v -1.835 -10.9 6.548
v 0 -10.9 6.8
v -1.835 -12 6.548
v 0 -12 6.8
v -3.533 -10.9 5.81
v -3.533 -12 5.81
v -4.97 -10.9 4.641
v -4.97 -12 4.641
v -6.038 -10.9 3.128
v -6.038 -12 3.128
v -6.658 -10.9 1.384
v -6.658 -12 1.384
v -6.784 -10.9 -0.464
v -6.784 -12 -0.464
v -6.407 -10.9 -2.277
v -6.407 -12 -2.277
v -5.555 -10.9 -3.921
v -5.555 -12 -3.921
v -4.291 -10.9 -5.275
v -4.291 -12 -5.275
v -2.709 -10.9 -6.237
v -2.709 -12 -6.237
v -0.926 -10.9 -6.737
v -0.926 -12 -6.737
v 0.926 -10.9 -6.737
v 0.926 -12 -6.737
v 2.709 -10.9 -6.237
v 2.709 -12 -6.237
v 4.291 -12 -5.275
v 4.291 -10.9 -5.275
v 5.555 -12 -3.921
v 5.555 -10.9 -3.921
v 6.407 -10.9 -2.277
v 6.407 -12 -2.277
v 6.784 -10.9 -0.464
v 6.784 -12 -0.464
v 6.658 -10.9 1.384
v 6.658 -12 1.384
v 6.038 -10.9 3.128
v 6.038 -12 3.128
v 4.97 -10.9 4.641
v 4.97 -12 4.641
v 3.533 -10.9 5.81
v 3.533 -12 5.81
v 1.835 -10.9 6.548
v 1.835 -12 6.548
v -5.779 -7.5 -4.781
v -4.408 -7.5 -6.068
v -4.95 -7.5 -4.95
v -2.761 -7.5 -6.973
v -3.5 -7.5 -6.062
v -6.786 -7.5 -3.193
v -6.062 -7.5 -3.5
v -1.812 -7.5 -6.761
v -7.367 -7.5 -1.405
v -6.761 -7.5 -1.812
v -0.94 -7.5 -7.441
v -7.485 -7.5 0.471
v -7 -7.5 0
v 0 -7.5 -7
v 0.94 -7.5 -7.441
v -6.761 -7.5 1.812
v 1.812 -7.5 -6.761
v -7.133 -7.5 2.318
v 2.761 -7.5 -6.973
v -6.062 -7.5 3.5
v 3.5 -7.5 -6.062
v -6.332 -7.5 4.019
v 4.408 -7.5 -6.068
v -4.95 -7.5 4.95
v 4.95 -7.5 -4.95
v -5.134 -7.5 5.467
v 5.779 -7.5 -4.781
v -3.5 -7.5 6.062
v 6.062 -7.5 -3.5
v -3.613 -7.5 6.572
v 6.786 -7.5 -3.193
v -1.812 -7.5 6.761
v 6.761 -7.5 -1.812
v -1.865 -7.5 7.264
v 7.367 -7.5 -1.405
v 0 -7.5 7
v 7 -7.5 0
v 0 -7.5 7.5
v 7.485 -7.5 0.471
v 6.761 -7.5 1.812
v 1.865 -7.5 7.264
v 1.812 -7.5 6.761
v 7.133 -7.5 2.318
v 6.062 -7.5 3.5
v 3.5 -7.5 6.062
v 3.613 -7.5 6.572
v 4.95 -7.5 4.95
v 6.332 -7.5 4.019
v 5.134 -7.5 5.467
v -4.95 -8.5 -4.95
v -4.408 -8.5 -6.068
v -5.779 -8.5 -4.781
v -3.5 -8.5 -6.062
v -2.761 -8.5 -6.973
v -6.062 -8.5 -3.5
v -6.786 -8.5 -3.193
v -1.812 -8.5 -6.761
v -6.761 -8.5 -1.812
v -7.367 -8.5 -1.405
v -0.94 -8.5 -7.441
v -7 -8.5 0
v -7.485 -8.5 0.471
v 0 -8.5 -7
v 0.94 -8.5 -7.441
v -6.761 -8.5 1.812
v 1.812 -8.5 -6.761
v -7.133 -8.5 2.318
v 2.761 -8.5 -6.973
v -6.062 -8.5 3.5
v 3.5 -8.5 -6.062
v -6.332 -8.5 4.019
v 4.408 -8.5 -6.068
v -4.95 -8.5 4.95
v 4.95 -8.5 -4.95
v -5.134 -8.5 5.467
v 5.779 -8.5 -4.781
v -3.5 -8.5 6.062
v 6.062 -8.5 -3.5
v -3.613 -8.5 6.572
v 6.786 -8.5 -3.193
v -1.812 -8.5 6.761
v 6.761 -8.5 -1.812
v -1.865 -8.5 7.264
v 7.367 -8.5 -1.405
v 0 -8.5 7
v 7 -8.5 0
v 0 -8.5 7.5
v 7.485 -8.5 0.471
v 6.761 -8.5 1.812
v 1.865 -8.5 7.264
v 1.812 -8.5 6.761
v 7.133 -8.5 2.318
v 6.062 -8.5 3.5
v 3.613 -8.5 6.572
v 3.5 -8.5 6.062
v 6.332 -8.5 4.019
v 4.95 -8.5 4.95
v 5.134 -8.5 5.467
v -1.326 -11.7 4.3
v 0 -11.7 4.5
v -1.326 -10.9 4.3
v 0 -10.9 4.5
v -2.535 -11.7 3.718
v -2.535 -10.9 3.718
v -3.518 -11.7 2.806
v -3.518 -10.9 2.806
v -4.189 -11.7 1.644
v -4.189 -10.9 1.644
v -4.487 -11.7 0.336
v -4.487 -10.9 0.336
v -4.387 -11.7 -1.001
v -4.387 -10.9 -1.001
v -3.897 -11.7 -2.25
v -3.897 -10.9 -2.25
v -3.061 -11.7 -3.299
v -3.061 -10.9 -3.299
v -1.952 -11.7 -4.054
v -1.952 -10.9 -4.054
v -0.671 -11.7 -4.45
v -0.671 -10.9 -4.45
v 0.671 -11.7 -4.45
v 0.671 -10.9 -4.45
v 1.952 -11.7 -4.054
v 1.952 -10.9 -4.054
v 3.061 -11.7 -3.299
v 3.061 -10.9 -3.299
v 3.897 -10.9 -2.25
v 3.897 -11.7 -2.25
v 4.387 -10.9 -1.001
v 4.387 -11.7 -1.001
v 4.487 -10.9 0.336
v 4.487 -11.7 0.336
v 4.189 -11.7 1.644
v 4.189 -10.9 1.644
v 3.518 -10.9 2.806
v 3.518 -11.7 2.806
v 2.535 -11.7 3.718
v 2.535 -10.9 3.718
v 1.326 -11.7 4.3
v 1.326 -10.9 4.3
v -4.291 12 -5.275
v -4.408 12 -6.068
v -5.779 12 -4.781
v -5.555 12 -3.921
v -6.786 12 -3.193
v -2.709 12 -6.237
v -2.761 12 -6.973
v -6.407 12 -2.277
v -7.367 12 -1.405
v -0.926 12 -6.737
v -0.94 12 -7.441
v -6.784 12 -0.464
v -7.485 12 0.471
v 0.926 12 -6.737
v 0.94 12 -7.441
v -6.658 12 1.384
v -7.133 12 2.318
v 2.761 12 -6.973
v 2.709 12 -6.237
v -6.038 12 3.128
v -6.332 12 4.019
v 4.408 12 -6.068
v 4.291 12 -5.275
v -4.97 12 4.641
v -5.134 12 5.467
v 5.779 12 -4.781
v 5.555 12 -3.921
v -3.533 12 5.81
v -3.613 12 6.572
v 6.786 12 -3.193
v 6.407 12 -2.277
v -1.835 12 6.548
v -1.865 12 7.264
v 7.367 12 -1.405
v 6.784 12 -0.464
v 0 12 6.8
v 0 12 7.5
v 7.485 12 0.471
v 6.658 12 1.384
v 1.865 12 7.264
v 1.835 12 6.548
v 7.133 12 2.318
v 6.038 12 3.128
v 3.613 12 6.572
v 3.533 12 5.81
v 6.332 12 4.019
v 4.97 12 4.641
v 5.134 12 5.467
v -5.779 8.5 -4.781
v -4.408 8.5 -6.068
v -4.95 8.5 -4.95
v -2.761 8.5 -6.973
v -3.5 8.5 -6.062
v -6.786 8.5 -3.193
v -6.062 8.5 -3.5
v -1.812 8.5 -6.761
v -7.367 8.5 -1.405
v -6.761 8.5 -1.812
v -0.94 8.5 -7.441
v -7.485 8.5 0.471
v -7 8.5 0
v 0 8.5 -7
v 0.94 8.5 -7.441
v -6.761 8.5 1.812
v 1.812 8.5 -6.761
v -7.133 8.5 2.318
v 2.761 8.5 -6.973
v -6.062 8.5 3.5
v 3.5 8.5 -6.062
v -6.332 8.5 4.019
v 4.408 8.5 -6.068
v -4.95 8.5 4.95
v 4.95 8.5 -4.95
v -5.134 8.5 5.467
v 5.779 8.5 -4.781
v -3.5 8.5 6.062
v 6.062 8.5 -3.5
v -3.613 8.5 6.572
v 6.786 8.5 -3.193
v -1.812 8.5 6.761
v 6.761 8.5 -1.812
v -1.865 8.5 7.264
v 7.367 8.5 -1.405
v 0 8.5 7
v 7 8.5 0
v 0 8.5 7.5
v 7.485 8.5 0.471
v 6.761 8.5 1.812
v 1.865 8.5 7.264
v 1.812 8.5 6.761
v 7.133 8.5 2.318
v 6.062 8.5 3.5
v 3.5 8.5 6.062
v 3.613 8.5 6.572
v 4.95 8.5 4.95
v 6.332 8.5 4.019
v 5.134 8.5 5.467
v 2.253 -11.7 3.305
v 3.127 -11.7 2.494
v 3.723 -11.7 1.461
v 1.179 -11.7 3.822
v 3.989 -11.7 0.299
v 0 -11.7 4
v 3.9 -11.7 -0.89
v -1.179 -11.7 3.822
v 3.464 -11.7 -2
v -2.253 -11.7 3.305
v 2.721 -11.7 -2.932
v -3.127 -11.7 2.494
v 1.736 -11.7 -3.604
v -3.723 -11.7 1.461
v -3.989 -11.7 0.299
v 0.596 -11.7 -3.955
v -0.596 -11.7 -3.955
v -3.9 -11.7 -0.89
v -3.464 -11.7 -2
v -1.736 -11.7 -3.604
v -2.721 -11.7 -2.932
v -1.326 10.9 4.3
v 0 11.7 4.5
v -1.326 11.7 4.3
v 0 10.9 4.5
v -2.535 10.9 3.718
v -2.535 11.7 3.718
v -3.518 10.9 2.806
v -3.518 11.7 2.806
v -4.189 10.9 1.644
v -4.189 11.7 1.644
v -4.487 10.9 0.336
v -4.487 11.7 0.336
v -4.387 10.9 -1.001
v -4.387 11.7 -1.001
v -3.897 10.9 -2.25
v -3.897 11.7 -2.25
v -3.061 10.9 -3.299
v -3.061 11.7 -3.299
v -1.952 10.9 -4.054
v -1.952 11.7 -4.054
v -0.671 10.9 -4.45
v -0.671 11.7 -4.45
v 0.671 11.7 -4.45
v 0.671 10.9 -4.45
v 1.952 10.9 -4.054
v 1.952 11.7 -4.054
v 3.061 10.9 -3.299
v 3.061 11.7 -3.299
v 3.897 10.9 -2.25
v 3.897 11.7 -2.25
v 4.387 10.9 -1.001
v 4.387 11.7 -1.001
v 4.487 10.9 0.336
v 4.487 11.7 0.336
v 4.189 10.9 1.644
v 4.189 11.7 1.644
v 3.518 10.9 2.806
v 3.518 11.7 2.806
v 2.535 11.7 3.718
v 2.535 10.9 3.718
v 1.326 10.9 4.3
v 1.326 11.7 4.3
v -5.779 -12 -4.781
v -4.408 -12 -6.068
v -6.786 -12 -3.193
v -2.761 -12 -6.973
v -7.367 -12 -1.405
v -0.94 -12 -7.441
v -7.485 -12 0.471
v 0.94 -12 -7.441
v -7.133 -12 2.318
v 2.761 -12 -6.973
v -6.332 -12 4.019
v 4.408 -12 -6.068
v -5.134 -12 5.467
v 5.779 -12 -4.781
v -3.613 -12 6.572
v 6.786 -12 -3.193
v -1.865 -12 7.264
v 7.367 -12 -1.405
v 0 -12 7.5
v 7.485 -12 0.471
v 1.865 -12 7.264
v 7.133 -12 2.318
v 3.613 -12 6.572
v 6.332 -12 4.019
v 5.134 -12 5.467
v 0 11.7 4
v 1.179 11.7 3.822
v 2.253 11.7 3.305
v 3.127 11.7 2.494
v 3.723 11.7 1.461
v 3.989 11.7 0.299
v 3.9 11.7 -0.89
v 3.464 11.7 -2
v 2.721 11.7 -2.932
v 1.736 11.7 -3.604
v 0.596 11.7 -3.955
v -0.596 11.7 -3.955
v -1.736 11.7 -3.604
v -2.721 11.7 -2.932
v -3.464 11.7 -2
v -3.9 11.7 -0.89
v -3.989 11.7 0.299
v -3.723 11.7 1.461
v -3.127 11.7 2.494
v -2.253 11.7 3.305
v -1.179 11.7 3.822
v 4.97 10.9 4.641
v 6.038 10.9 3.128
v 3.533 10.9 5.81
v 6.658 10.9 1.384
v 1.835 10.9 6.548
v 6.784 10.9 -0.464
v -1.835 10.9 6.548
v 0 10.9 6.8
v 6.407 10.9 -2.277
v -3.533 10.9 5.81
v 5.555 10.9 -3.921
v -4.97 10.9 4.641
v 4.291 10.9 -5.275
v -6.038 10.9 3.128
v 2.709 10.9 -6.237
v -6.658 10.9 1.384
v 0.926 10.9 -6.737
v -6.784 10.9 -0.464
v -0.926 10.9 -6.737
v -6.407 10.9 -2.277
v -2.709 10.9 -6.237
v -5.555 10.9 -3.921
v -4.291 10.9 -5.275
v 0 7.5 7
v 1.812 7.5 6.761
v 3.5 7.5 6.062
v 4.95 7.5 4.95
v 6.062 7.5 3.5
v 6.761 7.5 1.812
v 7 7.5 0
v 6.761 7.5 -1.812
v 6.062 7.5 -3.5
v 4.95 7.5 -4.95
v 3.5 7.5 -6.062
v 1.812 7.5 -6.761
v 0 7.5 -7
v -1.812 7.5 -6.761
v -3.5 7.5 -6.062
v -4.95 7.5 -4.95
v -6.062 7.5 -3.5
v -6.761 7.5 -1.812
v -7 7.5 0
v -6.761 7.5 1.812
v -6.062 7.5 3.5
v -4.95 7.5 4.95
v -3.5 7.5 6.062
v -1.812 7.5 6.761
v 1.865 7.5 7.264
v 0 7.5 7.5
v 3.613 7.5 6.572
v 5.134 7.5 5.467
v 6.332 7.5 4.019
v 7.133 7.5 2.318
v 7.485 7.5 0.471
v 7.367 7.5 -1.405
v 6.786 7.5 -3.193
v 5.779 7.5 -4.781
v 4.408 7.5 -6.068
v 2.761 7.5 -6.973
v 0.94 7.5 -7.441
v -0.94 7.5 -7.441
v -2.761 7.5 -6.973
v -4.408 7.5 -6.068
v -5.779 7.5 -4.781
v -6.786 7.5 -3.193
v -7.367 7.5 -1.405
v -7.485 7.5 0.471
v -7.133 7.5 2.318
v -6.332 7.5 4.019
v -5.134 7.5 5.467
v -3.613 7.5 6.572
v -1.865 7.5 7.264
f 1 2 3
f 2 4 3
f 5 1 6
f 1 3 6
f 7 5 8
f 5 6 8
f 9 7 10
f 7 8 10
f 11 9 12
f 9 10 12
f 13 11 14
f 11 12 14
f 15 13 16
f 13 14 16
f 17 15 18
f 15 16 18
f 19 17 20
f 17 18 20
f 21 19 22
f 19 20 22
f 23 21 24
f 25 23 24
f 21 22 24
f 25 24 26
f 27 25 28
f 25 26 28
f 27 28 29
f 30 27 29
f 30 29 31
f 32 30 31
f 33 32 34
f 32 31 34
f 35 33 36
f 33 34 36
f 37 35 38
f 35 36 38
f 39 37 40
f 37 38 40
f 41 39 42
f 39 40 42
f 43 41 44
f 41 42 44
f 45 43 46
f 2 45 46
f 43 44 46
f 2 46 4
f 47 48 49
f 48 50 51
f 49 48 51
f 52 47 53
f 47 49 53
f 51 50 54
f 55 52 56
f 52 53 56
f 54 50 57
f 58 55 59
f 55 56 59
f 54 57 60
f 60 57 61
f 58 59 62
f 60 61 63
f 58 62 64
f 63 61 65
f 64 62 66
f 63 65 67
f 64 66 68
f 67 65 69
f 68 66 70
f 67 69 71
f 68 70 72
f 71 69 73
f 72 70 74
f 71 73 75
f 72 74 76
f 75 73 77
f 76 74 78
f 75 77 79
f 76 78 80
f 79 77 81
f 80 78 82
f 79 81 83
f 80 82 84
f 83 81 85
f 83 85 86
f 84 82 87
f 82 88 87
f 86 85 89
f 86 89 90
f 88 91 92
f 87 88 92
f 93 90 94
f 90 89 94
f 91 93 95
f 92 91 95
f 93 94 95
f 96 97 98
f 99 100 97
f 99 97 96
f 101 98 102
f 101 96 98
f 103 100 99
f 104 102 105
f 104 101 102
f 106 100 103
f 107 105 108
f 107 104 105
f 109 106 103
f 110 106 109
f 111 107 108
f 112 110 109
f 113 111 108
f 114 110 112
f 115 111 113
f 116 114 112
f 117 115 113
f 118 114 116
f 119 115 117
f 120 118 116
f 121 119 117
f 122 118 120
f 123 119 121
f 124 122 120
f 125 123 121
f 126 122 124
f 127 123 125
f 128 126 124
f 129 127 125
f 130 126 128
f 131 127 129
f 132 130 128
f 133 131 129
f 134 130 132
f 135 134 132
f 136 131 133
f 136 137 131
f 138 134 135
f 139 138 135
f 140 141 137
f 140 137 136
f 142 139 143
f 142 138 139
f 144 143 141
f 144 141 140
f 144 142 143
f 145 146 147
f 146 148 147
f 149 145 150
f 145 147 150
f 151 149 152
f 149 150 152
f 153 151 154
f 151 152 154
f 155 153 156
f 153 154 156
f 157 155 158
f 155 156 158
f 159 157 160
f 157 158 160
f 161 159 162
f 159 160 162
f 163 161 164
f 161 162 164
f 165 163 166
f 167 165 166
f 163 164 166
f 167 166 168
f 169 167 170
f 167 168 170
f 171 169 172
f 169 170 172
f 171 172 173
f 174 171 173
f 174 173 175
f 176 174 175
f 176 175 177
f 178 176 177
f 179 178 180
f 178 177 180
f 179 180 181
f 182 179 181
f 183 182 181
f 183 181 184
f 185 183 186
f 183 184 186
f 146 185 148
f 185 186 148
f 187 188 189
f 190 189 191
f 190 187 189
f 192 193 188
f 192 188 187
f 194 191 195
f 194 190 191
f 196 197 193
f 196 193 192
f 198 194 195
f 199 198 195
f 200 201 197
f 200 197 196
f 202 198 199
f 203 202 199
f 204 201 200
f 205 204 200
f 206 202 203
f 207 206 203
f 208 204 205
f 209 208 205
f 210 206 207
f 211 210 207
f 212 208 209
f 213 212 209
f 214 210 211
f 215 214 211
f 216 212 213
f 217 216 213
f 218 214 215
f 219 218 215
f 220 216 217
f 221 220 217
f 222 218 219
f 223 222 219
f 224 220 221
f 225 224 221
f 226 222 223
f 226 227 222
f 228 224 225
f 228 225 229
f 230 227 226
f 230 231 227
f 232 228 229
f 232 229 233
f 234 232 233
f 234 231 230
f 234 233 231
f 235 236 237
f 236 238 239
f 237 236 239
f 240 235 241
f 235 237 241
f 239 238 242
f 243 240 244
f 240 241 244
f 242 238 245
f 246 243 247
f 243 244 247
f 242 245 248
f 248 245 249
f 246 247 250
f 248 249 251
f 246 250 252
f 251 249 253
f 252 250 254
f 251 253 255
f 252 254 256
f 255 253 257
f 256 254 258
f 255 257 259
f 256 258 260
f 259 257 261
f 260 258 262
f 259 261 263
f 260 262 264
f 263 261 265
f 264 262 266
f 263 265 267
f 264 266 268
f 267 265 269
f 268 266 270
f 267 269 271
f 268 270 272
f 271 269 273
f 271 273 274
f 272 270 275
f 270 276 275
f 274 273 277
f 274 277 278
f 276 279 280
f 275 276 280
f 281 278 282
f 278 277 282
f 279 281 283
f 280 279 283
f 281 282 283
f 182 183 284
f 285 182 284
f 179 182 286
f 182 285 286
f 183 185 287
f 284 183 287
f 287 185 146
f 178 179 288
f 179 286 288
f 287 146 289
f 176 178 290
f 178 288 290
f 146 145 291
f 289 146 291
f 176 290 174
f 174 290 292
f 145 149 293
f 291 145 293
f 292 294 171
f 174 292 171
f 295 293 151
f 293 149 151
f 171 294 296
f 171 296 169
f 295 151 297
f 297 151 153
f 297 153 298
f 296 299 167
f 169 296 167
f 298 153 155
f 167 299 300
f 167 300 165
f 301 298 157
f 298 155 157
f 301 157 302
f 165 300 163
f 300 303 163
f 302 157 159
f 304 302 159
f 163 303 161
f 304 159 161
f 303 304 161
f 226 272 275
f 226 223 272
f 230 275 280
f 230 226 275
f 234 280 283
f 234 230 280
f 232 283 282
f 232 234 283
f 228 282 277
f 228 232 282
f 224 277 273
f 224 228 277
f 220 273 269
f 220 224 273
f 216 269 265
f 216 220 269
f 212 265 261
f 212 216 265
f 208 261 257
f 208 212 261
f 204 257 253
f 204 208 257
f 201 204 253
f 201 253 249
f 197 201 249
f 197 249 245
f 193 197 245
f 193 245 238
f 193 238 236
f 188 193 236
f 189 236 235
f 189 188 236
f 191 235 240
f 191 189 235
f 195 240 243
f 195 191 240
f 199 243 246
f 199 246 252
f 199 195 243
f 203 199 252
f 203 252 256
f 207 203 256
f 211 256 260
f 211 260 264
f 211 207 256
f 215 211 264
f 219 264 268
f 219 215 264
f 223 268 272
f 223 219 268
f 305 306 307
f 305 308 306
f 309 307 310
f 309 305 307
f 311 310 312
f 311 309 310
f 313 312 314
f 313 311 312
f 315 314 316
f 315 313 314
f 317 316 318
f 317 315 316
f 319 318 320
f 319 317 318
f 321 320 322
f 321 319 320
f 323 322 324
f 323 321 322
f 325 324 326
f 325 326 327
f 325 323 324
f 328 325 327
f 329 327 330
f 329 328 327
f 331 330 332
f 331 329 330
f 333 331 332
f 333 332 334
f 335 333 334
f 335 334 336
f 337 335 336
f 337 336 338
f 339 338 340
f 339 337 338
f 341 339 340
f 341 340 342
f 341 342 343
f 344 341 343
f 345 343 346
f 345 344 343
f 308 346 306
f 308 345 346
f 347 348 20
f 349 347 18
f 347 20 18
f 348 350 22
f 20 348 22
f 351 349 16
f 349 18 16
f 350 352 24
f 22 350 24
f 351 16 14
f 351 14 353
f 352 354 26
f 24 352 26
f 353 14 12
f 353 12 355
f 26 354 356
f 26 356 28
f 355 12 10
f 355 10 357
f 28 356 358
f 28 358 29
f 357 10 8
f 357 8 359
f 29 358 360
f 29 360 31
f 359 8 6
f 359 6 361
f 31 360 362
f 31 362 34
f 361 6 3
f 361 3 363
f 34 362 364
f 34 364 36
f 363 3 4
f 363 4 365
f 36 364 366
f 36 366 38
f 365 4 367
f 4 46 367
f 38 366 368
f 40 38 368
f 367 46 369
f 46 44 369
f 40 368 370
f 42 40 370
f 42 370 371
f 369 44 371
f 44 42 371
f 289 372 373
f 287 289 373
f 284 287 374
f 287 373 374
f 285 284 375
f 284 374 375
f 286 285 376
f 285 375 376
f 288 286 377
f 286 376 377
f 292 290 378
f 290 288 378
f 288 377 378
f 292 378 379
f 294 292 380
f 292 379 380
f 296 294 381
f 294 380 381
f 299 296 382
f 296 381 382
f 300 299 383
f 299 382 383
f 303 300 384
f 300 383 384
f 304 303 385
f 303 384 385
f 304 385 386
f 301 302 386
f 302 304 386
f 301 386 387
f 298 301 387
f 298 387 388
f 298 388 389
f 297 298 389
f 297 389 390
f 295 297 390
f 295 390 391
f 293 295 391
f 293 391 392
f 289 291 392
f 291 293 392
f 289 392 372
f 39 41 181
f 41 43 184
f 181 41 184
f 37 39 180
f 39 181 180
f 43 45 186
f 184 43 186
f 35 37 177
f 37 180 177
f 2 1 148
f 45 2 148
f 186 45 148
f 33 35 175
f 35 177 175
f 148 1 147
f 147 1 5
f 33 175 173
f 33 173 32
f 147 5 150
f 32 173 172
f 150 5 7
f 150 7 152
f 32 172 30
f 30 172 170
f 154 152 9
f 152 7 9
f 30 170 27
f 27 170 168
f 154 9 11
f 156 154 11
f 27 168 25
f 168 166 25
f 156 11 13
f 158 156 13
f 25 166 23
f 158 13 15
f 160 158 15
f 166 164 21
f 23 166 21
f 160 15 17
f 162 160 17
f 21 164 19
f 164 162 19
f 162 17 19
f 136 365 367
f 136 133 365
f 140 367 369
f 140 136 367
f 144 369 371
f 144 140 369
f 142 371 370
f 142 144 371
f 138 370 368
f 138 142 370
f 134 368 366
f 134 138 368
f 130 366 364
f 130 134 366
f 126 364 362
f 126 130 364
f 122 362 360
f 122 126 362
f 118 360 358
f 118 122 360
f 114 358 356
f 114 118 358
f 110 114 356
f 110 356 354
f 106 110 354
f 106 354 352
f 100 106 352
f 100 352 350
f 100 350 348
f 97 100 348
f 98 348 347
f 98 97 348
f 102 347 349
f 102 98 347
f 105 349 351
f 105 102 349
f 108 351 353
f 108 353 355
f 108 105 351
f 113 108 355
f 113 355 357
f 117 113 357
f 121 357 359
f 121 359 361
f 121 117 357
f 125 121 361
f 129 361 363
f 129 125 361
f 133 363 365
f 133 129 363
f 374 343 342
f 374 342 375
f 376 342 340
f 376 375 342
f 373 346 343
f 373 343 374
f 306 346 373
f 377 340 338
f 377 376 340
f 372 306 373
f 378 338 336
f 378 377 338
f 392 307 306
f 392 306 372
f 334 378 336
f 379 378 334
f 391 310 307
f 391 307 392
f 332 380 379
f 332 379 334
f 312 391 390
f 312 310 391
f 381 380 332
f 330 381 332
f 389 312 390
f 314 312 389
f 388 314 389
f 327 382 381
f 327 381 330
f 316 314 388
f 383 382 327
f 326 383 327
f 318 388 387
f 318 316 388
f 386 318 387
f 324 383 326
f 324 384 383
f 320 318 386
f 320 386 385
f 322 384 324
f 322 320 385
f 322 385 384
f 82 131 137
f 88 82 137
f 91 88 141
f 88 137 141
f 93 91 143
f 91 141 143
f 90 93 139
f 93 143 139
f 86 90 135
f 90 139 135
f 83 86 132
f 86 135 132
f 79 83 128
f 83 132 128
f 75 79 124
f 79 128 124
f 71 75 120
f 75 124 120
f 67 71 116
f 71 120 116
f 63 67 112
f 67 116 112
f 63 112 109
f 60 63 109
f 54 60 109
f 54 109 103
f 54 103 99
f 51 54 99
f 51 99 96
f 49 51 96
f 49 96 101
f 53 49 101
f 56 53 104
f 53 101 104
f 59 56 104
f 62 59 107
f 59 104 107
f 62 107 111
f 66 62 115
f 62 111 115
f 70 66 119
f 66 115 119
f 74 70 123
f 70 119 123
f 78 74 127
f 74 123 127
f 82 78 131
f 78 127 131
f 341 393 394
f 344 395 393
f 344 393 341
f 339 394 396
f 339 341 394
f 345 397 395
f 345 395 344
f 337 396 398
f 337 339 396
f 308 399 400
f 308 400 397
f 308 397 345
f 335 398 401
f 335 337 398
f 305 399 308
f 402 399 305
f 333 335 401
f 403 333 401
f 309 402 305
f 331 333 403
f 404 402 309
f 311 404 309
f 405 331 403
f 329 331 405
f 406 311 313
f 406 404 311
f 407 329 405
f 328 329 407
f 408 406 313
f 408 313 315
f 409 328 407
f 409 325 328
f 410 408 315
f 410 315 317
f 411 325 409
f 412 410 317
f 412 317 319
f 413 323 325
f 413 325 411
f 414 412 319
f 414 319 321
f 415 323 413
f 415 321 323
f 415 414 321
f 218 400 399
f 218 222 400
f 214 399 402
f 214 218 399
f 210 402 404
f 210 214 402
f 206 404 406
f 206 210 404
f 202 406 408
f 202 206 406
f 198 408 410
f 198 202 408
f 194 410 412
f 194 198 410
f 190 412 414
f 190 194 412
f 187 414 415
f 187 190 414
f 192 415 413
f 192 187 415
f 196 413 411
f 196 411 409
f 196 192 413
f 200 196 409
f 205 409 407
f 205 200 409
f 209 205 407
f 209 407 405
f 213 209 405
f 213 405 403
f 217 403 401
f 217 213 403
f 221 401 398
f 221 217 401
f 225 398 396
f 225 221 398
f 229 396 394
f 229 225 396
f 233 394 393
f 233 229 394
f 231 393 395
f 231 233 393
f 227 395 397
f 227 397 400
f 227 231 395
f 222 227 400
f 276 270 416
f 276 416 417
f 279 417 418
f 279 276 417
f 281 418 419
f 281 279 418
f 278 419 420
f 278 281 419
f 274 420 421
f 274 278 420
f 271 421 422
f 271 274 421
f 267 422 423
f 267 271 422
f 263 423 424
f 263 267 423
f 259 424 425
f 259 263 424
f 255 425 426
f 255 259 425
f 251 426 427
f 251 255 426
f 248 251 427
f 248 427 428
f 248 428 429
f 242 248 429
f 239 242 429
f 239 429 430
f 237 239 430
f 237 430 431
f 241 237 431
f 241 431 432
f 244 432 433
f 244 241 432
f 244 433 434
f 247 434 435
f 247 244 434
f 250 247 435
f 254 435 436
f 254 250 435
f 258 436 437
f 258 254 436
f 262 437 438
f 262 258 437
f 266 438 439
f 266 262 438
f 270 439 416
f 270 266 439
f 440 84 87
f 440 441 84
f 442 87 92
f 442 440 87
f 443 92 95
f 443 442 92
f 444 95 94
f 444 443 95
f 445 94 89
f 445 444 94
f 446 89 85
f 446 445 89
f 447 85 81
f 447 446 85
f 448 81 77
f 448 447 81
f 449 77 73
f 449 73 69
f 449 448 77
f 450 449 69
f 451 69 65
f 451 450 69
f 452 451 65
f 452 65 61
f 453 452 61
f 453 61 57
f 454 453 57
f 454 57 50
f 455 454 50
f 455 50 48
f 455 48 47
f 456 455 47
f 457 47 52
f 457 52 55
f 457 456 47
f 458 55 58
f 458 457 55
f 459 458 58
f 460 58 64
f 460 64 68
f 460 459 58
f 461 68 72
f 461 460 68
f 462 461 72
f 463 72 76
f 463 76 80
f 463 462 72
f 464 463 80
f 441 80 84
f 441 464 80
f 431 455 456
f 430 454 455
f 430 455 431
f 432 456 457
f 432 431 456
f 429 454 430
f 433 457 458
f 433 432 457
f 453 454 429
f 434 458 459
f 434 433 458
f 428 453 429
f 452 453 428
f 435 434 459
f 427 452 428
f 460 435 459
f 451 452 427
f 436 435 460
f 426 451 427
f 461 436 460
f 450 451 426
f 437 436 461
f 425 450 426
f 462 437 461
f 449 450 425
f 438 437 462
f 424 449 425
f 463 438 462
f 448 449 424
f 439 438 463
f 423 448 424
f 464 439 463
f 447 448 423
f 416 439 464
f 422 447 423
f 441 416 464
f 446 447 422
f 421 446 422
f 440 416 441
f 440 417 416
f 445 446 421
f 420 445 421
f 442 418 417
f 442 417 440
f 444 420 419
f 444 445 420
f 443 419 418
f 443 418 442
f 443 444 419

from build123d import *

# Parameters (mm, degrees)
SKETCH1_R           = 7.5
BOSS_EXTRUDE1_DEPTH = 12
SKETCH2_R           = 4
CUT_EXTRUDE1_DEPTH  = 24
CUT_EXTRUDE2_START  = -3.5
SKETCH3_R           = 7.5
SKETCH3_R_2         = 7
CUT_EXTRUDE2_DEPTH  = 1


with BuildPart() as part:
    # Sketch1 → Boss-Extrude1 (new, symmetric)
    with BuildSketch(Plane(origin=(0, 0, 0), x_dir=(1, 0, 0), z_dir=(0, 1, 0))):
        with Locations(Location((0, 0, 0), (0, 0, 270))):
            Circle(SKETCH1_R)
    extrude(amount=BOSS_EXTRUDE1_DEPTH, both=True)

    # Sketch2 → Cut-Extrude1 (cut)
    with BuildSketch(Plane(origin=(0, 12, 0), x_dir=(1, 0, 0), z_dir=(0, 1, 0))):
        with Locations(Location((0, 0, 0), (0, 0, 270))):
            Circle(SKETCH2_R)
    extrude(amount=-CUT_EXTRUDE1_DEPTH, mode=Mode.SUBTRACT)

    # Sketch3 → Cut-Extrude2 (cut)
    with BuildSketch(Plane(origin=(0, 12, 0), x_dir=(1, 0, 0), z_dir=(0, 1, 0)).offset(CUT_EXTRUDE2_START)):
        with Locations(Location((0, 0, 0), (0, 0, 270))):
            Circle(SKETCH3_R)
        with Locations(Location((0, 0, 0), (0, 0, 270))):
            Circle(SKETCH3_R_2, mode=Mode.SUBTRACT)
    cut_extrude2 = extrude(amount=-CUT_EXTRUDE2_DEPTH, mode=Mode.SUBTRACT)

    # Sketch4 → Cut-Revolve1 (revolve, cut)
    with BuildSketch(Plane(origin=(0, 0, 0), x_dir=(0, 0, -1), z_dir=(1, 0, 0)), mode=Mode.PRIVATE) as cut_revolve1_sk:
        Polygon((4, 12), (4, 11.7), (4.5, 11.7), (4.5, 10.9), (6.8, 10.9), (6.8, 12), align=None)
    cut_revolve1 = revolve(cut_revolve1_sk.sketch.rotate(Axis((0, 10.5, 0), (0, -1, 0)), 180), axis=Axis((0, 10.5, 0), (0, -1, 0)), mode=Mode.SUBTRACT)

    # Mirror1: Cut-Extrude2, Cut-Revolve1 across plane
    add(cut_extrude2.mirror(Plane.ZX), mode=Mode.SUBTRACT)
    add(cut_revolve1.mirror(Plane.ZX), mode=Mode.SUBTRACT)


solid = part.part
